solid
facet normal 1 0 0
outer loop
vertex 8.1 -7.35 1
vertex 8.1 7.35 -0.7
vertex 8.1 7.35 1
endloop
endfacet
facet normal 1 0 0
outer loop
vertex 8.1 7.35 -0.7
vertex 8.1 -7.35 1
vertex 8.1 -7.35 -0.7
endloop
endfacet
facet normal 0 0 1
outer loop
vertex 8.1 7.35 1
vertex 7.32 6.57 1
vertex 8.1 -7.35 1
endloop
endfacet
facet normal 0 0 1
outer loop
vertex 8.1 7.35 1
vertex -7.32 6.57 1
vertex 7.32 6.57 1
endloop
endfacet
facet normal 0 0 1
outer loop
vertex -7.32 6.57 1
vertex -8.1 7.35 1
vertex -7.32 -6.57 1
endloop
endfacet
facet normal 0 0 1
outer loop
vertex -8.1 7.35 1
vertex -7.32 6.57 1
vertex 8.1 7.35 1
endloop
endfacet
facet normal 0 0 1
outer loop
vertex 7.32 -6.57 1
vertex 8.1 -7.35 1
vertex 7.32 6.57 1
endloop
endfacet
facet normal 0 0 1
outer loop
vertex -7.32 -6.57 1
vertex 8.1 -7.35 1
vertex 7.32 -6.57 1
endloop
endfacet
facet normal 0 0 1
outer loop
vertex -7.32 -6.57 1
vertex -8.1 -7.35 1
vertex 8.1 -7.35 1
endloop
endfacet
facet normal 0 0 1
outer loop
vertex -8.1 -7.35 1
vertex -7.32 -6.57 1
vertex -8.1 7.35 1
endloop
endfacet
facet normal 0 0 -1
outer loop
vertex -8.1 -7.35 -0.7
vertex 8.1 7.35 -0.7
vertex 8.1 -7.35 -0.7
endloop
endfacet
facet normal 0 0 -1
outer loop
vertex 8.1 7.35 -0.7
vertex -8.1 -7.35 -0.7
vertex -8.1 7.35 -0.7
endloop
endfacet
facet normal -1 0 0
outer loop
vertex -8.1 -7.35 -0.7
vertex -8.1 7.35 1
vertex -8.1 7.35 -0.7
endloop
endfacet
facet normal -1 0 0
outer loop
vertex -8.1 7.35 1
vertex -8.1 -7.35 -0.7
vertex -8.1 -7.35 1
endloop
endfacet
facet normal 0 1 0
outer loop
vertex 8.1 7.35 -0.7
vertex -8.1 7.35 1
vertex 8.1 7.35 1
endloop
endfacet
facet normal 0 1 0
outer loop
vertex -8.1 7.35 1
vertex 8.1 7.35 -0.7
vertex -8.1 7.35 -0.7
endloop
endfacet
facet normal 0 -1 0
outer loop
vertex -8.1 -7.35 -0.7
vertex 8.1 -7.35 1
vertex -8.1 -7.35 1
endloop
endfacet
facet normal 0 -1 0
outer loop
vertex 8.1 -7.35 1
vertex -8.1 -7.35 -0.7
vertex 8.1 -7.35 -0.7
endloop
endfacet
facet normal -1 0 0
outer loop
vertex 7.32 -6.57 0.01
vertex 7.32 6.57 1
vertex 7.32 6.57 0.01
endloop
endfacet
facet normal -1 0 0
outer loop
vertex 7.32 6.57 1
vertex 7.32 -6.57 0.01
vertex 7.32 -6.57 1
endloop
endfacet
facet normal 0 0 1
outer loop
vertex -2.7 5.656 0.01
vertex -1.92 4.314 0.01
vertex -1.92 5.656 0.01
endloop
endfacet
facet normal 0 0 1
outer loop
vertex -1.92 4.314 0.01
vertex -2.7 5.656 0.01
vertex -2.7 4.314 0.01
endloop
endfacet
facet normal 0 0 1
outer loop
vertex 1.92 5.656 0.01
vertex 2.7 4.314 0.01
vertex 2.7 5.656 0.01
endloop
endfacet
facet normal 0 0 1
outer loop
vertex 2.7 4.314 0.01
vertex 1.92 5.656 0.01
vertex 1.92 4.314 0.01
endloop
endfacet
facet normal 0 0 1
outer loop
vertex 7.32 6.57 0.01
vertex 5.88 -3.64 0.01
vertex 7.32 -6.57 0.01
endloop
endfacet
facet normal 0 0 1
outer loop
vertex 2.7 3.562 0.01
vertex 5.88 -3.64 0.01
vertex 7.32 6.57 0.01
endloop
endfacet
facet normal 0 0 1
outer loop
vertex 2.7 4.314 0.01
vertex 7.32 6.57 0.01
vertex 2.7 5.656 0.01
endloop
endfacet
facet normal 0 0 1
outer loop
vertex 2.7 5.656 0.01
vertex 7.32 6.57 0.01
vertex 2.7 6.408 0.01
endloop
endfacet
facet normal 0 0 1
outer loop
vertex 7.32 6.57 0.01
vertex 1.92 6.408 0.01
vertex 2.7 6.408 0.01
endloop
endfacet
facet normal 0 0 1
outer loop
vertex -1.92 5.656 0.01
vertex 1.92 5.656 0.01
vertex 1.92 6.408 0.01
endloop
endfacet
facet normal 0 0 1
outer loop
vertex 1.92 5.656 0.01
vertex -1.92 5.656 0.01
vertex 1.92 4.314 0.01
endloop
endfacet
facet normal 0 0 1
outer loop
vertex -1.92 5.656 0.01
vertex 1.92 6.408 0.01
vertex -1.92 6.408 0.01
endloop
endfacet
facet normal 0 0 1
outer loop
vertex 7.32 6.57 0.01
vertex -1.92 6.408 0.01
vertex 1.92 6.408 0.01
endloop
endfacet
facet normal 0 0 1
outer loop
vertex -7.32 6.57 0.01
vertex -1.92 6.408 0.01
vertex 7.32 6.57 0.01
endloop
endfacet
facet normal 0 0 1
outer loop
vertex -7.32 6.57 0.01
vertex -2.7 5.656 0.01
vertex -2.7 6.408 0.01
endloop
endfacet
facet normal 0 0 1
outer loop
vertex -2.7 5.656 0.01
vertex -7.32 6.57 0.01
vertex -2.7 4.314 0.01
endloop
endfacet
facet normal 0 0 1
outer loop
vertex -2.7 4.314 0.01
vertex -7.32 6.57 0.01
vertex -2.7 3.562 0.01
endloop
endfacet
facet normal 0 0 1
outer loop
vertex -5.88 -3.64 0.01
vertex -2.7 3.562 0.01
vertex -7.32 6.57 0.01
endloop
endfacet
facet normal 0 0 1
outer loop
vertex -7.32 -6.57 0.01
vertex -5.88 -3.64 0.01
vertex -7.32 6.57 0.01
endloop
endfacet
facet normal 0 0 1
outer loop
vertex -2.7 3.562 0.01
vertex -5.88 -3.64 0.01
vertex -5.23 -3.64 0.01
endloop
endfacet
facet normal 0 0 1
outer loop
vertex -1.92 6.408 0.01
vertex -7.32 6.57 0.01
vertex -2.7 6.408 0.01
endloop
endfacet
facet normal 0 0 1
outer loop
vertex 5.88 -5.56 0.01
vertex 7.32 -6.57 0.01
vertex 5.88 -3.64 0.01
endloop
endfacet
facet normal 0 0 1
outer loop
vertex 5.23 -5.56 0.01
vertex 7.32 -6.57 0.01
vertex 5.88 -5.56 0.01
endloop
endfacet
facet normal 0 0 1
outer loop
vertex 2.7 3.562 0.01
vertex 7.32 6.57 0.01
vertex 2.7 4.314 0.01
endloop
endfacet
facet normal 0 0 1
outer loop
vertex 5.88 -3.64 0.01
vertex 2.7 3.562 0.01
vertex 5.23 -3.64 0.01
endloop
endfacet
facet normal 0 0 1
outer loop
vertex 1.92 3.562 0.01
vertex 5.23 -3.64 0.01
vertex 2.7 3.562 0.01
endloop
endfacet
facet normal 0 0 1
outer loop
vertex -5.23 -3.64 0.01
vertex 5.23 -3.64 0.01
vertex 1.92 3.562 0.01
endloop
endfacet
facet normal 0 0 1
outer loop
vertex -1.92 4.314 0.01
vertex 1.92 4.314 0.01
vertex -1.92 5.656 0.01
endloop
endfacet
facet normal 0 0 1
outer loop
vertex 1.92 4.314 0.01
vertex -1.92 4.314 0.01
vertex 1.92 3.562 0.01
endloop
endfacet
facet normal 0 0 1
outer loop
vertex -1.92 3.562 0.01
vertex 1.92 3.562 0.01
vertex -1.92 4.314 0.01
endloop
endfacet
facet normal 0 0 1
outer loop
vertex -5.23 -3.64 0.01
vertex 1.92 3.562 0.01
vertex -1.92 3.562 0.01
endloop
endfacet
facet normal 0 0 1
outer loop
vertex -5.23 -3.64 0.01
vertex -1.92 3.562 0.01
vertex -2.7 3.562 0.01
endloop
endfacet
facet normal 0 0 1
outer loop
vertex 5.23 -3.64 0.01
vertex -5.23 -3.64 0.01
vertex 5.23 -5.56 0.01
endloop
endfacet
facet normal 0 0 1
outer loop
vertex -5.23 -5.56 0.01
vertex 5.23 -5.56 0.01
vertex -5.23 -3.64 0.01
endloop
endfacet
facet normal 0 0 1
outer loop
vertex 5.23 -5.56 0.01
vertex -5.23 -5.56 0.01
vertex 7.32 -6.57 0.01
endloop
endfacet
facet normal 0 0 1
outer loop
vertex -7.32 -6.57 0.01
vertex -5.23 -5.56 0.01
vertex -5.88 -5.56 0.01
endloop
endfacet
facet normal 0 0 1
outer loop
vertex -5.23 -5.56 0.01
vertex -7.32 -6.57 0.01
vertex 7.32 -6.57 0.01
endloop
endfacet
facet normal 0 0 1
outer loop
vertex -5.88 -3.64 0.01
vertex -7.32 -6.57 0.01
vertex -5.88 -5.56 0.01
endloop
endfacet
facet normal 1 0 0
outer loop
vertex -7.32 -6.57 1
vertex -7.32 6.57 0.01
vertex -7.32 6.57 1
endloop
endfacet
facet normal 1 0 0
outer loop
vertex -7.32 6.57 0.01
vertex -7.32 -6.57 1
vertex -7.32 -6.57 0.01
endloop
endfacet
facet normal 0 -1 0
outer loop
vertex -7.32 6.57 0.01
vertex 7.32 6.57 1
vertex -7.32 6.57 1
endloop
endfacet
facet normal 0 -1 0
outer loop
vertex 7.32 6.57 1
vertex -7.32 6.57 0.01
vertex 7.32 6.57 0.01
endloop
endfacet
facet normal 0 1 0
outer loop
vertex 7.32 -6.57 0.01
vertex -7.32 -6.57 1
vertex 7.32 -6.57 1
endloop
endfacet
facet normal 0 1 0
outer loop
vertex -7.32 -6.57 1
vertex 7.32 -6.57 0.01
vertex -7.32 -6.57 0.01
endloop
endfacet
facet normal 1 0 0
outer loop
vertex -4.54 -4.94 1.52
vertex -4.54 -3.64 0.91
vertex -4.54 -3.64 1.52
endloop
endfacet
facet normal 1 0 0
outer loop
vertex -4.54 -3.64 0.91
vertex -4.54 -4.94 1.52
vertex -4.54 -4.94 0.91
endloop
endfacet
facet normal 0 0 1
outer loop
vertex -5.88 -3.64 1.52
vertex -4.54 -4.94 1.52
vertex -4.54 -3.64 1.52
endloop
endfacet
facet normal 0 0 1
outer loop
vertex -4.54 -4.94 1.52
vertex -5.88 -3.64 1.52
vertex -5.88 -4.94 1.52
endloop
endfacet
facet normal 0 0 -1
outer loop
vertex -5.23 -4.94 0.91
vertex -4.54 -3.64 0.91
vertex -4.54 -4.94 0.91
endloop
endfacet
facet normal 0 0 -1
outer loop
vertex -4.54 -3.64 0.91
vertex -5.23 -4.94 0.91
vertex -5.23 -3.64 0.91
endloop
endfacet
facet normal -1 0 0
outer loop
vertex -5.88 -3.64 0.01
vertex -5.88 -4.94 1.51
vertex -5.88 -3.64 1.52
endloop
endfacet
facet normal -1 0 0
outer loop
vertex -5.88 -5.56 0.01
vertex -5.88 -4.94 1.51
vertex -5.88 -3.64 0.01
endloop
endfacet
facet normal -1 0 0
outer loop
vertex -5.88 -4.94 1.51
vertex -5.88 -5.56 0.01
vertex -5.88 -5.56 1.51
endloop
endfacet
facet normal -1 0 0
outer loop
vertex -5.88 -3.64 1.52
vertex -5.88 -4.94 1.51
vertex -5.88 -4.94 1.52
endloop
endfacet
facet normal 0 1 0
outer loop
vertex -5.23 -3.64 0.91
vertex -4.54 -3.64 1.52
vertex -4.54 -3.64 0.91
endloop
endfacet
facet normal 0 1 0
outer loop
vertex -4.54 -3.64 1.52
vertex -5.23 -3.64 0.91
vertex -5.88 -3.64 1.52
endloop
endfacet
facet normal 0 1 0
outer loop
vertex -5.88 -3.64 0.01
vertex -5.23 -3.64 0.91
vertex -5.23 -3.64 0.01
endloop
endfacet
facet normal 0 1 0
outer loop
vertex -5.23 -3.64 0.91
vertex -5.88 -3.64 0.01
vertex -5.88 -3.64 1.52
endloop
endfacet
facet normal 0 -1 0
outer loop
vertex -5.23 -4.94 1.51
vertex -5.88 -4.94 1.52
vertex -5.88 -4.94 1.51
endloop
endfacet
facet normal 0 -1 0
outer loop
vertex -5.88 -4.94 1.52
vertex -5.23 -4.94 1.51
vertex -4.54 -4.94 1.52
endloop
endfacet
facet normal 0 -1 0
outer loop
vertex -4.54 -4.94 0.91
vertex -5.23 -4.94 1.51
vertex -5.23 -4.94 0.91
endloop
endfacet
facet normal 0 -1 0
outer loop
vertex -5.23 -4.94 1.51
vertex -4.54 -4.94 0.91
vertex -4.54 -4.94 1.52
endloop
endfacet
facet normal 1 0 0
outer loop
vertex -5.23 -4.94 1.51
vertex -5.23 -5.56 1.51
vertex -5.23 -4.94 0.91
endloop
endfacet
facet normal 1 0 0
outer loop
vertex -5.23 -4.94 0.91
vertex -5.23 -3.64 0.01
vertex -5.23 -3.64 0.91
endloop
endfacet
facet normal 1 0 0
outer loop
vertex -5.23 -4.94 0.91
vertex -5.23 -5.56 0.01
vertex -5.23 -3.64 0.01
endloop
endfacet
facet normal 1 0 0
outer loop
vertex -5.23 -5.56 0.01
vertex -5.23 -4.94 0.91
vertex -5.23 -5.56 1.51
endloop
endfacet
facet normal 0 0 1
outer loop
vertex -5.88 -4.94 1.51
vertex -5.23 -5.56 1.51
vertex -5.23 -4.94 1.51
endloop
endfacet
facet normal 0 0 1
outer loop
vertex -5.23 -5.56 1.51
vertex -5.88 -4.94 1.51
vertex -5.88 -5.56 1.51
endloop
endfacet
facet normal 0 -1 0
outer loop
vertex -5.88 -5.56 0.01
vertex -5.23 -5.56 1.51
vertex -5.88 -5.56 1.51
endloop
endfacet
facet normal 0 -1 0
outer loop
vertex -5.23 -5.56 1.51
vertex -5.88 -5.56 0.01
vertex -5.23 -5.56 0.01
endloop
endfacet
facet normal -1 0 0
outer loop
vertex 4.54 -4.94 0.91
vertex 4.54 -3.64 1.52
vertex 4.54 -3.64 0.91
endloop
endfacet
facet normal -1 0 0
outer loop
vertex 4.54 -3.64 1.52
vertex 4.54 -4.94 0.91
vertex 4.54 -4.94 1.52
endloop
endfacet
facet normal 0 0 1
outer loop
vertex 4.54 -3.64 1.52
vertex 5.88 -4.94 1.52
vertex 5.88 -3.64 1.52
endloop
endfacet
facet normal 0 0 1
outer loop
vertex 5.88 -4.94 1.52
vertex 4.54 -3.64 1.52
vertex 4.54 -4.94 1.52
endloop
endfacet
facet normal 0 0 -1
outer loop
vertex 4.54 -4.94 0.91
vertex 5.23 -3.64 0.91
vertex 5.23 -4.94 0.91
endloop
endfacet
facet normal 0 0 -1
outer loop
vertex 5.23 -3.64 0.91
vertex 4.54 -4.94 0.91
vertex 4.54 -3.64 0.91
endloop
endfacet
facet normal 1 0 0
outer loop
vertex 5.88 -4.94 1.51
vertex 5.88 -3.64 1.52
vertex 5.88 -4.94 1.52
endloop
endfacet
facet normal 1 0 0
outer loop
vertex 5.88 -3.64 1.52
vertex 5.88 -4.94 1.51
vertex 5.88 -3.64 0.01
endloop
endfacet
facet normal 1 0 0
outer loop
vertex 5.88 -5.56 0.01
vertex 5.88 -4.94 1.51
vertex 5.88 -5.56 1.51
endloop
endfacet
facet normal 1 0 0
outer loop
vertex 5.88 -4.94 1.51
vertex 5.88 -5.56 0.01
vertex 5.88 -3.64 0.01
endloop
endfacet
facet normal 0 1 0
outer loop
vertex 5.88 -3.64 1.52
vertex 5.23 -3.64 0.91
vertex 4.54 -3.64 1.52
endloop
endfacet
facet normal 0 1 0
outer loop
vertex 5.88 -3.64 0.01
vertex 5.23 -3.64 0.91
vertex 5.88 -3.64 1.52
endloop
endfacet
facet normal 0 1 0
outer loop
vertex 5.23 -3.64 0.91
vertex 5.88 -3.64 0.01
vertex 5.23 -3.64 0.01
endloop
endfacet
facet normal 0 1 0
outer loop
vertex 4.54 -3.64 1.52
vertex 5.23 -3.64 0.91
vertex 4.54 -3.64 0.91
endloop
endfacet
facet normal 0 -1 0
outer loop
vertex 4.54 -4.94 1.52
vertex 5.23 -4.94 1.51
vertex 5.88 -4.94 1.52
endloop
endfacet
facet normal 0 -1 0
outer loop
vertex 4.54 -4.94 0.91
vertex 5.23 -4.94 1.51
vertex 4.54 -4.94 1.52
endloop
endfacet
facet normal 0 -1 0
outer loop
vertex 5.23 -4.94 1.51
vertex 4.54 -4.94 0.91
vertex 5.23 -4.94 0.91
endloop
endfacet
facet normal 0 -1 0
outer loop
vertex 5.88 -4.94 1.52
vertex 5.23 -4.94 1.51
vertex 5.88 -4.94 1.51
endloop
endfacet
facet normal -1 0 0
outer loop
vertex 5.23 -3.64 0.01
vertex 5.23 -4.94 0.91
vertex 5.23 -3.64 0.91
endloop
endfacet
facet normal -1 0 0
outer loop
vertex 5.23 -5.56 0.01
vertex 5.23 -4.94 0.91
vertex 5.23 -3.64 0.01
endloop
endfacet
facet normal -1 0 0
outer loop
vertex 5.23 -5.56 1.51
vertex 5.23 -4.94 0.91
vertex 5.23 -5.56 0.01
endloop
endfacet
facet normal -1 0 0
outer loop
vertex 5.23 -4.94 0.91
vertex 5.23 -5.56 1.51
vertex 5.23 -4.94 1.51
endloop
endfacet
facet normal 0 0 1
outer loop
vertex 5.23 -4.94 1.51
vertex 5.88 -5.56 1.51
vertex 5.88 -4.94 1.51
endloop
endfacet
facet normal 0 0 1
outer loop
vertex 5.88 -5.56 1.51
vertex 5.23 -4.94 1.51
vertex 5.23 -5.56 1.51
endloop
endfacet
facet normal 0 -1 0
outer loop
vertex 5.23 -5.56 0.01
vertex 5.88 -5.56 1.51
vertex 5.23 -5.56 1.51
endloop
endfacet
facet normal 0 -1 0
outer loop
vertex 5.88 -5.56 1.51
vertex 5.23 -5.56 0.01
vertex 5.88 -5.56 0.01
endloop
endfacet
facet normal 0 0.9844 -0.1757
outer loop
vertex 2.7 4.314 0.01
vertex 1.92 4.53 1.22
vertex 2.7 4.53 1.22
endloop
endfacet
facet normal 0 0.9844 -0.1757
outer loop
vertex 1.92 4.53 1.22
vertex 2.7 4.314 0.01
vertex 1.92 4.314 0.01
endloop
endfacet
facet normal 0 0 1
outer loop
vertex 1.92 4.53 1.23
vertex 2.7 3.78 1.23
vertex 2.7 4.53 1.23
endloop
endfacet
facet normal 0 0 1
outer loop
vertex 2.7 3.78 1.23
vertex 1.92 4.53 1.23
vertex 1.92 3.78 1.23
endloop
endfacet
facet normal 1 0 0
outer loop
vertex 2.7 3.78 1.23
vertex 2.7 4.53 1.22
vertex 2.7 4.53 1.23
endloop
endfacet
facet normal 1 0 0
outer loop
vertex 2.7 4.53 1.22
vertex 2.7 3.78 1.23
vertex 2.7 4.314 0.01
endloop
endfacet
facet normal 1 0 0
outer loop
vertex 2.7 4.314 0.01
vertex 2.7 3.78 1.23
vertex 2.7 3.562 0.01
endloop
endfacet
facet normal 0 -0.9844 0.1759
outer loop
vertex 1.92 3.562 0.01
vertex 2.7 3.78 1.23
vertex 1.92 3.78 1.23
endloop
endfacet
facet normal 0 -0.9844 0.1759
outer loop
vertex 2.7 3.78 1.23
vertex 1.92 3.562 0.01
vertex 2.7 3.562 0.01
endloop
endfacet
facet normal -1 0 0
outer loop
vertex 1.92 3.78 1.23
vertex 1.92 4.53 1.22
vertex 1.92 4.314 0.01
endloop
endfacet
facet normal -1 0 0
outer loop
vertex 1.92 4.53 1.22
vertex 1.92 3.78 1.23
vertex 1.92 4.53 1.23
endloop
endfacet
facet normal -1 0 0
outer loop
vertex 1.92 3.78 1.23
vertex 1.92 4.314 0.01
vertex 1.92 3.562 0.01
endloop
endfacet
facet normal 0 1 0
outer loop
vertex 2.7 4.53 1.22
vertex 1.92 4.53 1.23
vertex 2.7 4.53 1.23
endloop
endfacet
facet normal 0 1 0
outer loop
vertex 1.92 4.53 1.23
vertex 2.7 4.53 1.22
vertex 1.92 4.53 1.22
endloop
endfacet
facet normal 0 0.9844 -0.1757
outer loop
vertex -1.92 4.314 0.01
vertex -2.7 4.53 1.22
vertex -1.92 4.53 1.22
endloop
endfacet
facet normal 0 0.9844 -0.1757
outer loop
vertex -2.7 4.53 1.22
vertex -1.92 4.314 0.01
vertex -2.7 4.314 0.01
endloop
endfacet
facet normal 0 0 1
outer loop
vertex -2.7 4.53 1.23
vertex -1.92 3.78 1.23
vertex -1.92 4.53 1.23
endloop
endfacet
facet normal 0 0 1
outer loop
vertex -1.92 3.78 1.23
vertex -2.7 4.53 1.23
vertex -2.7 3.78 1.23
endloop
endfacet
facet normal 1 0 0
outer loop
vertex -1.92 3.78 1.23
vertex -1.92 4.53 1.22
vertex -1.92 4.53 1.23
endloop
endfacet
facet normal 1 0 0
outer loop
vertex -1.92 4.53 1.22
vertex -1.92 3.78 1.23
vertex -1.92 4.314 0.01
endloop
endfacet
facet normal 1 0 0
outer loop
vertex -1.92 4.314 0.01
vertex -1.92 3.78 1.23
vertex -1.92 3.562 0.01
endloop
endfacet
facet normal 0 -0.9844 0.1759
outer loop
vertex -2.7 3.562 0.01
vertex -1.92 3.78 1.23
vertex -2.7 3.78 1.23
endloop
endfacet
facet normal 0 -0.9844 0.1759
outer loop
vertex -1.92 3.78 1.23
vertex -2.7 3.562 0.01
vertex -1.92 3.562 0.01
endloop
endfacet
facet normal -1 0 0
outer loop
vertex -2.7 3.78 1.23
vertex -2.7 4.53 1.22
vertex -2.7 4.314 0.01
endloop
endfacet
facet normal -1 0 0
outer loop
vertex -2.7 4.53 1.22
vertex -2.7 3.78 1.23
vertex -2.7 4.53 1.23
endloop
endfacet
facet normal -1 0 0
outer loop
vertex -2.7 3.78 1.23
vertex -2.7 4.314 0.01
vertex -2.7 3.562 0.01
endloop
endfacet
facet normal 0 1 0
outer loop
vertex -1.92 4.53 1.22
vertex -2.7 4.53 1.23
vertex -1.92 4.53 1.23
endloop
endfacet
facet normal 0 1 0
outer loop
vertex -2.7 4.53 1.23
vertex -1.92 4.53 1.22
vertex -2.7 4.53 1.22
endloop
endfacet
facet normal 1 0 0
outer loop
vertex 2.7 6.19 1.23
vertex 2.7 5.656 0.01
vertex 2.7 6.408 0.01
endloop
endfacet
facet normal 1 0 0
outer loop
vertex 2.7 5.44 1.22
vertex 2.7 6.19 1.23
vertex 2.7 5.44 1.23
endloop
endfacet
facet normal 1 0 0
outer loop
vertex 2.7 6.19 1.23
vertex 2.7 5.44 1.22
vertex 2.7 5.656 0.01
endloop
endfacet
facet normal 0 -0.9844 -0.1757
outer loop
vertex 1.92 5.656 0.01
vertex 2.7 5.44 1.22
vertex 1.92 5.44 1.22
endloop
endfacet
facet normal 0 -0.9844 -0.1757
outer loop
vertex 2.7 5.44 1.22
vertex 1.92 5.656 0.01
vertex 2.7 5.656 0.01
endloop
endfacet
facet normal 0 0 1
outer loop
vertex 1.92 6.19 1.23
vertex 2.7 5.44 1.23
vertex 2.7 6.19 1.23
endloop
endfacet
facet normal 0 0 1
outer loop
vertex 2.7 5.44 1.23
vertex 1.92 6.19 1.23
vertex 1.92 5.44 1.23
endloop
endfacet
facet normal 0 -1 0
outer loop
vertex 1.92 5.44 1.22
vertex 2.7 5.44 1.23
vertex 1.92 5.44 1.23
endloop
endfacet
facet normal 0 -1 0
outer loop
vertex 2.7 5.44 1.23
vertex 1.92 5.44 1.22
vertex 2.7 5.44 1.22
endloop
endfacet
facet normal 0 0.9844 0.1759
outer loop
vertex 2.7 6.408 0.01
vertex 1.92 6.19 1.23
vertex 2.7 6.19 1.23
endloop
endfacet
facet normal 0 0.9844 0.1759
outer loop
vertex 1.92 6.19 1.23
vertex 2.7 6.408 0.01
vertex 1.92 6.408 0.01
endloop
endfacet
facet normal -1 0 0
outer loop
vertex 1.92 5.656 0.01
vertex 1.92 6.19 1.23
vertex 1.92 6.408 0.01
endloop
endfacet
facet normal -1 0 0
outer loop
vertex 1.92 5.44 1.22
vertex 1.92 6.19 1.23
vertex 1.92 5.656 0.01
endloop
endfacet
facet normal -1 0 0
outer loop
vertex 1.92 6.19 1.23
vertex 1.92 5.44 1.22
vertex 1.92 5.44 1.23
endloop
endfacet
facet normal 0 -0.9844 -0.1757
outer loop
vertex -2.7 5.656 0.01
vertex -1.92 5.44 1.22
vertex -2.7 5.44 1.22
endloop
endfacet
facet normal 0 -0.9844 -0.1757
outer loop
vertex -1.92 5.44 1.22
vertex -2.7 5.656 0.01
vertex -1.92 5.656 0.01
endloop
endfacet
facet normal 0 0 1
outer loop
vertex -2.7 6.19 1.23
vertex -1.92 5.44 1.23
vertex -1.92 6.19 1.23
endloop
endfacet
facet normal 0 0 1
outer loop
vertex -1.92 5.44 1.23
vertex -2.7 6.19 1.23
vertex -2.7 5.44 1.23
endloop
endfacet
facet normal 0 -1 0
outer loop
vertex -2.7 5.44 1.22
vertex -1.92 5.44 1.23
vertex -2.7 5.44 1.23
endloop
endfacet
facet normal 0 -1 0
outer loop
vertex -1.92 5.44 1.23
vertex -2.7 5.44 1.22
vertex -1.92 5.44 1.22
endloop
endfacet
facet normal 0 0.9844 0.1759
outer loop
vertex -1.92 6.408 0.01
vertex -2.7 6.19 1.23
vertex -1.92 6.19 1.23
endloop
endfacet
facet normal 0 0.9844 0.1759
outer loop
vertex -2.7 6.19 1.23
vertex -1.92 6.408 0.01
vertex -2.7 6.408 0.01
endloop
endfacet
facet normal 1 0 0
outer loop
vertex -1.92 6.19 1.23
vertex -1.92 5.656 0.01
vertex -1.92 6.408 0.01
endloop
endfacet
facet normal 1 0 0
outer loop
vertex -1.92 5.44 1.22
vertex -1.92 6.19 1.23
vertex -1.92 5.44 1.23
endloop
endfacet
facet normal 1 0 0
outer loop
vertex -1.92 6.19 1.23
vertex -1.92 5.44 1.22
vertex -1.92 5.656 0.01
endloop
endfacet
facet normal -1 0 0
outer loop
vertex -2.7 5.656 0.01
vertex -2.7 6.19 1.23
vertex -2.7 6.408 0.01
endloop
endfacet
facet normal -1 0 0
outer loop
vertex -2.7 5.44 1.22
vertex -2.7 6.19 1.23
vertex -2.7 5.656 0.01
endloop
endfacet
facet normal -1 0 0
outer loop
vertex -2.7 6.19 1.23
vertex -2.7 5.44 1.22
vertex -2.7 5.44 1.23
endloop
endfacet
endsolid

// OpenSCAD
// Key cap for ASUS UX303 (letter "K")
//
// The key is face down.

// The base (top) plate - very thin!

translate([-16.2/2, -14.7/2, -0.70]) {
    difference () {
        cube([16.2, 14.7, 1.70]);
        translate ([0.78, 0.78, 0.71]) {
            cube([16.2-(0.78*2), 14.7-(0.78*2), 1.01]);
        }
    }
}

// inside horn of a clamp
module clamp_inside_horn () {
    hull() {
        translate([0, 0, 1.22])   cube([0.78, 0.75, 0.01]);
        translate([0, -0.22, -0.01]) cube([0.78, 0.75, 0.01]);
    }
}

// outside horn of a clamp
module clamp_outside_horn () {
    hull() {
        translate([0, 0, 1.22])   cube([0.78, 0.75, 0.01]);
        translate([0, 0.22, -0.01]) cube([0.78, 0.75, 0.01]);
    }
}

translate([1.92,         3.78, 0]) clamp_inside_horn();
translate([-(1.92+0.78), 3.78, 0]) clamp_inside_horn();

translate([1.92,         5.44, 0]) clamp_outside_horn();
translate([-(1.92+0.78), 5.44, 0]) clamp_outside_horn();

module sliding_rail () {
    union () {
        translate([0, 1.92-1.30, 0.91]) {
            cube([1.34, 1.30, 0.61]);
        }
        translate([0, 0, -0.01]) {
            cube([0.65, 1.92, 1.52]);
        }
    }
}

translate([-5.88, -5.56, 0]) sliding_rail();
translate([5.88, -5.56, 0]) {
    mirror([1,0,0]) sliding_rail();
}
